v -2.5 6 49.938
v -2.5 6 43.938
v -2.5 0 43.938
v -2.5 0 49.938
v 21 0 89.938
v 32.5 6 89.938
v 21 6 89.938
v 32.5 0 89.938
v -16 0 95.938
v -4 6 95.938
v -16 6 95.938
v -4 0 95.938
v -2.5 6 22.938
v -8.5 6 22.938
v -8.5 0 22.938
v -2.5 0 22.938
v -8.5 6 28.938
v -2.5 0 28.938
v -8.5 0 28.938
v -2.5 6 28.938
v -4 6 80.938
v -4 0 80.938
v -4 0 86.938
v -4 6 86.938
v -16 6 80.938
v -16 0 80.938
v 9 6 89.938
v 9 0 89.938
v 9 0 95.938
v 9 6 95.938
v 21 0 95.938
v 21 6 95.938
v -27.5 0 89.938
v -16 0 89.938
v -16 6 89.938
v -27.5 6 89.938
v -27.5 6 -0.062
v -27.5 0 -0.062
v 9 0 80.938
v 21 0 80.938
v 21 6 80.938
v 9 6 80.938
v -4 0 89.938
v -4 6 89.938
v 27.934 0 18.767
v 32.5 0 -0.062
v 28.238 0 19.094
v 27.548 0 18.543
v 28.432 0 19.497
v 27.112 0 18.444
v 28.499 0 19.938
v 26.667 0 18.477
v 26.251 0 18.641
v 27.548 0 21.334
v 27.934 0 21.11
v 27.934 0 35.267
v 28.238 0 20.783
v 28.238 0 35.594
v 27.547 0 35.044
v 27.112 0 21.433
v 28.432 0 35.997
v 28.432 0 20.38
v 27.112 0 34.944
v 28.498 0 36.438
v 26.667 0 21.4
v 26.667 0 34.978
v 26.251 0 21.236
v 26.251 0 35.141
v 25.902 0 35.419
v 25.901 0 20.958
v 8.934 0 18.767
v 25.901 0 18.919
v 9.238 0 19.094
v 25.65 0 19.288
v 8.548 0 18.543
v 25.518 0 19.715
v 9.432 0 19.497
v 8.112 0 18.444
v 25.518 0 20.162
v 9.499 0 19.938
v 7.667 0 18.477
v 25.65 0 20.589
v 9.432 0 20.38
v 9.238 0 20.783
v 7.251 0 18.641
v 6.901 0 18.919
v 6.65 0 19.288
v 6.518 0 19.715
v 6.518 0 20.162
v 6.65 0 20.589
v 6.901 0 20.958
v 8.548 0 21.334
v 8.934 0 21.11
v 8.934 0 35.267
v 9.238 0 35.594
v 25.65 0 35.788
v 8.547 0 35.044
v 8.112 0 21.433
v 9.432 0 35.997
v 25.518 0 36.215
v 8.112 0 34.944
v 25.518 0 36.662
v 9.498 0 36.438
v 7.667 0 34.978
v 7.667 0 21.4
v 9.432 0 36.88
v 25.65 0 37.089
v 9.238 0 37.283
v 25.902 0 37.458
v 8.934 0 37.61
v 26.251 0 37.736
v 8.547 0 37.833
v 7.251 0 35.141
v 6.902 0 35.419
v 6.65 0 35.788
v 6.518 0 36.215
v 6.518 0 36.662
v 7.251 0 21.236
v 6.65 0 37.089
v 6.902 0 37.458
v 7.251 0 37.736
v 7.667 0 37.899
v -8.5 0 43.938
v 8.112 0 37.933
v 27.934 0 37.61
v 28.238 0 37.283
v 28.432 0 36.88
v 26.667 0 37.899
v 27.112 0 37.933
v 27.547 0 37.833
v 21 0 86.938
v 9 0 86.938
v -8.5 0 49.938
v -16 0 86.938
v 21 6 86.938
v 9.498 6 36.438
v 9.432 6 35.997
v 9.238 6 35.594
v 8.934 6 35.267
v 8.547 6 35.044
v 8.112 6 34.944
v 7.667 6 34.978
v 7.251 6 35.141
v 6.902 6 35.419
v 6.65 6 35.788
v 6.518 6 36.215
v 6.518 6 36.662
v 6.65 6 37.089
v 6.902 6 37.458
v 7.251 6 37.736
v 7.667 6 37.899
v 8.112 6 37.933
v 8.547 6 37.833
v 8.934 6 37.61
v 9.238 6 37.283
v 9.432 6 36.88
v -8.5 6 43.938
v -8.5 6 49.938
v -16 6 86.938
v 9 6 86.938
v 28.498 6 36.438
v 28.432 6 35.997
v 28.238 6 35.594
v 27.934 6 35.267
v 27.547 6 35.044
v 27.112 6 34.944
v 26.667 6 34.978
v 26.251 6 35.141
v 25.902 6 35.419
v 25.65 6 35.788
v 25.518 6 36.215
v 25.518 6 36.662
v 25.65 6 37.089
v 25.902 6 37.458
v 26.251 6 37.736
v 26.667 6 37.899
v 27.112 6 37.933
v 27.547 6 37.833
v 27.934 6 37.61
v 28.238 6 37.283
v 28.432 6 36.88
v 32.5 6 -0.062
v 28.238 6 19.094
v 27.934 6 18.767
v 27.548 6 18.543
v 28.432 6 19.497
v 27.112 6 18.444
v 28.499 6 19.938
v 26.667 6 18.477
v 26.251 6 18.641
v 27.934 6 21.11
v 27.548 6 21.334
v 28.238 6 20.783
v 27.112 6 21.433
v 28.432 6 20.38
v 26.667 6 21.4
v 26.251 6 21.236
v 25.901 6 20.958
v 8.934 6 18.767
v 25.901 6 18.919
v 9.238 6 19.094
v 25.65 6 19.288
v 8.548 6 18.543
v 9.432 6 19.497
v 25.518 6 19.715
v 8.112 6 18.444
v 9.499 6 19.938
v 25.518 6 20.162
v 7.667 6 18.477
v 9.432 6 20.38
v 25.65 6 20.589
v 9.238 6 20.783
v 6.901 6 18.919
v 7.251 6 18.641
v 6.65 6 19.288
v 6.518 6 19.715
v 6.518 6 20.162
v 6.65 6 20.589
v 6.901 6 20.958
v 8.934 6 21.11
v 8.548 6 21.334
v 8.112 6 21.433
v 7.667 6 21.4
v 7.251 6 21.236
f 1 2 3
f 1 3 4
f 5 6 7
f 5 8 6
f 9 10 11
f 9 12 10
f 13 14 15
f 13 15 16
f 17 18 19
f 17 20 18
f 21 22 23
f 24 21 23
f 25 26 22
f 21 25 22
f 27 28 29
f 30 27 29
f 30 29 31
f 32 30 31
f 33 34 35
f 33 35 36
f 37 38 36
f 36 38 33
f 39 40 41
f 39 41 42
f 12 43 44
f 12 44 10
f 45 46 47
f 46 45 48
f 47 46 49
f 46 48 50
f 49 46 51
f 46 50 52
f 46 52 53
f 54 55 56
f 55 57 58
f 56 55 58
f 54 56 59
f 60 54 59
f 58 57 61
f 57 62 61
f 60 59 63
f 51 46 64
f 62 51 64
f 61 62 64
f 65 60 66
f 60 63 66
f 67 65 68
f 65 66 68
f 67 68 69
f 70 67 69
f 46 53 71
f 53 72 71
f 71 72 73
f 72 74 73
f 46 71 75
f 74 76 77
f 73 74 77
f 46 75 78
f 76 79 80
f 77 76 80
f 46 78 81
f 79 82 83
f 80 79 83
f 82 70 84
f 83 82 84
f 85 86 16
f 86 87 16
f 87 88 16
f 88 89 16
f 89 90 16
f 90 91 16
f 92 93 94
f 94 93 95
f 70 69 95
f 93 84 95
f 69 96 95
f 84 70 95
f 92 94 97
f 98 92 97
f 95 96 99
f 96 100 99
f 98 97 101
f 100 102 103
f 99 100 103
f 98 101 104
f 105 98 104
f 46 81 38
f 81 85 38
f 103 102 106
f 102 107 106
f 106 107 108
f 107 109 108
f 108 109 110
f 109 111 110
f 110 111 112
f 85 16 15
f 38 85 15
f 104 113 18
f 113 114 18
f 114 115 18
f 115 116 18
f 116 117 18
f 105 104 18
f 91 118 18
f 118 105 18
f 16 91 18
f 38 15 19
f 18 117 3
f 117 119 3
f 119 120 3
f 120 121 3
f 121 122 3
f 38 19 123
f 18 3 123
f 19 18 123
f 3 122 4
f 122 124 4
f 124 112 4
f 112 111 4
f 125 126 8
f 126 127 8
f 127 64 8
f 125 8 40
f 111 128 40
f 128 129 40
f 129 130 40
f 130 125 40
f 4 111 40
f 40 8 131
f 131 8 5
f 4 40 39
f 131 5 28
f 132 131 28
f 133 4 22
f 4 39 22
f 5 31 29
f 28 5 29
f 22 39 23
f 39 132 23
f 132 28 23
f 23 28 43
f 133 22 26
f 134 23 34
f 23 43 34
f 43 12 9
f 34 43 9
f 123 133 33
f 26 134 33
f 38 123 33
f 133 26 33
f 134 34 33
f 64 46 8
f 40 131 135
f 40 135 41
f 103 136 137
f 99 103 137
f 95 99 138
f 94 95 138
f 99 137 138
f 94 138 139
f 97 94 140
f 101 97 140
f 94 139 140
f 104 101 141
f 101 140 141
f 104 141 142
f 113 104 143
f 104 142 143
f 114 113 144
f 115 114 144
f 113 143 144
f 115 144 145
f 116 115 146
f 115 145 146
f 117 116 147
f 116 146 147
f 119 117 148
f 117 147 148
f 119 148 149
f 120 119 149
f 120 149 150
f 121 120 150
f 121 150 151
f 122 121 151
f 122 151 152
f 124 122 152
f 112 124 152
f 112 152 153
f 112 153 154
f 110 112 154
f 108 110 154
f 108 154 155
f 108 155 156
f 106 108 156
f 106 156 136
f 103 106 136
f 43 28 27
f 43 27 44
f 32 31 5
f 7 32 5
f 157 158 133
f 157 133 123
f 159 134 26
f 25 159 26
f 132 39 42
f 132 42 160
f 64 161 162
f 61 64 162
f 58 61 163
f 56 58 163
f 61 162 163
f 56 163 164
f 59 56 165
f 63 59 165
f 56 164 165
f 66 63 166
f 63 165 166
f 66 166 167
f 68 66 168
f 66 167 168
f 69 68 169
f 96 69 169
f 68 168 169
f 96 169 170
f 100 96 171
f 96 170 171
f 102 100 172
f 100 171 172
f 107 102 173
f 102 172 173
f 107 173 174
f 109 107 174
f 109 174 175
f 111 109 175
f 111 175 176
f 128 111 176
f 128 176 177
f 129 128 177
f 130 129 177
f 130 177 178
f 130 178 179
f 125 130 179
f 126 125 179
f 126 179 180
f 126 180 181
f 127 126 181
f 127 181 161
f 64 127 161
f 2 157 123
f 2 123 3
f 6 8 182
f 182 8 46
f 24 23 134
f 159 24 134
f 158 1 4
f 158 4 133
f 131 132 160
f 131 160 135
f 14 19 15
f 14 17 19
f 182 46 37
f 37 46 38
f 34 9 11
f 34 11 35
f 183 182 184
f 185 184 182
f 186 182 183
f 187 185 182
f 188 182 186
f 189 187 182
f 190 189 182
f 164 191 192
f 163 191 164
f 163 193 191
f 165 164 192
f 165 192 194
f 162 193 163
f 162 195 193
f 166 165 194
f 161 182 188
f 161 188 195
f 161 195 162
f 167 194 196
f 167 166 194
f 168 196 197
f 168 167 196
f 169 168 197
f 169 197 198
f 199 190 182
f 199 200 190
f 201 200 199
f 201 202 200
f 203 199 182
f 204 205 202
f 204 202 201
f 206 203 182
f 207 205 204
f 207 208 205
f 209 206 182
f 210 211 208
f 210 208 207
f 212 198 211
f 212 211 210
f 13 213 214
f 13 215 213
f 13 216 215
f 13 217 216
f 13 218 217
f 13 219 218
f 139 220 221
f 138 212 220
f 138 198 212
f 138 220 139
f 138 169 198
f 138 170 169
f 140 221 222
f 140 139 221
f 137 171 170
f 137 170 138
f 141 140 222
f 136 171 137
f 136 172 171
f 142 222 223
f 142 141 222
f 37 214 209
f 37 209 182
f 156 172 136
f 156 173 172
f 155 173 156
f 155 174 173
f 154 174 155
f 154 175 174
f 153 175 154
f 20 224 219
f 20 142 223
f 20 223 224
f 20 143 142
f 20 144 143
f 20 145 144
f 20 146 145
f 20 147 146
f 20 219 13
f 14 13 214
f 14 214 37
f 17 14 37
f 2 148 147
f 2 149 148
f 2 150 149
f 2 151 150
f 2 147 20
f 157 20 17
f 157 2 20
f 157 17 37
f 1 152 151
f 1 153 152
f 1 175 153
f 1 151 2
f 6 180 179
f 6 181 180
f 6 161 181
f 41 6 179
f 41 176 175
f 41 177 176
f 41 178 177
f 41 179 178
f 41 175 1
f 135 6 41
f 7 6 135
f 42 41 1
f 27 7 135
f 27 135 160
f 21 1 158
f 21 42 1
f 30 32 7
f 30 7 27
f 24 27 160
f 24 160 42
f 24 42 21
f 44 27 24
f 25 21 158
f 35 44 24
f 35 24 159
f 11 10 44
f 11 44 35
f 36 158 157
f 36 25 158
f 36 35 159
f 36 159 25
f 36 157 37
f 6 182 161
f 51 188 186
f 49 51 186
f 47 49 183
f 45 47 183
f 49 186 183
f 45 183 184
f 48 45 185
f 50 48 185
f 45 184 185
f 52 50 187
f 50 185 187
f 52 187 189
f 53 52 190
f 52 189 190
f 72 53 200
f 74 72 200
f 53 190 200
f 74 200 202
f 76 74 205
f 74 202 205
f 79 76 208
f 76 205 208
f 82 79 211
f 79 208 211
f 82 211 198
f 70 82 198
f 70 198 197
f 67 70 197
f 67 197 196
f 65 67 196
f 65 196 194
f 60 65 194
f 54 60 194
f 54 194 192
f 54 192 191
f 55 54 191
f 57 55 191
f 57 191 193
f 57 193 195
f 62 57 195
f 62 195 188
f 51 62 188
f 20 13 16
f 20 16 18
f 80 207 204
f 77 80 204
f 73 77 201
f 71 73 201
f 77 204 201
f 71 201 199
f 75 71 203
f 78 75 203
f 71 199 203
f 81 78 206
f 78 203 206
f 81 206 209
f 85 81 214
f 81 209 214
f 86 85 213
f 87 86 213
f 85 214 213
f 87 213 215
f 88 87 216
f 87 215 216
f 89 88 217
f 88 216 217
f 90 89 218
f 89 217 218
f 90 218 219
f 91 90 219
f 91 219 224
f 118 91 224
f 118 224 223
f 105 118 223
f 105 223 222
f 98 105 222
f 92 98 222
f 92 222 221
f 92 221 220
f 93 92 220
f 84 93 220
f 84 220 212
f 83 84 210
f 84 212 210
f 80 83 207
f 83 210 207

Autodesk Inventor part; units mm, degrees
ref_plane "YZ Plane" through (0, 0, 0) normal (1, 0, 0) x (0, 1, 0)
ref_plane "XZ Plane" through (0, 0, 0) normal (0, 1, 0) x (-1, 0, 0)
ref_plane "XY Plane" through (0, 0, 0) normal (0, 0, 1) x (1, 0, 0)
sketch "Sketch1" plane through (0, 0, 0) normal (0, 1, 0) x (-1, 0, 0)
  line L0 (27.5, -0.0615) -> (27.5, 89.9385)
  line L1 (-32.5, 89.9385) -> (-32.5, -0.0615)
  line L2 (-32.5, -0.0615) -> (-2.5, -0.0615)
  line L3 (-2.5, -0.0615) -> (-2.5, 89.9385) construction
  line L4 (-32.5, 44.9385) -> (-2.5, 44.9385) construction
  line L5 (-32.5, 89.9385) -> (27.5, 89.9385)
  line L6 (-21, 89.9385) -> (-9, 89.9385)
  line L7 (-9, 89.9385) -> (-9, 95.9385)
  line L8 (-9, 95.9385) -> (-21, 95.9385)
  line L9 (-21, 95.9385) -> (-21, 89.9385)
  line L10 (16, 89.9385) -> (4, 89.9385)
  line L11 (4, 89.9385) -> (4, 95.9385)
  line L12 (4, 95.9385) -> (16, 95.9385)
  line L13 (16, 95.9385) -> (16, 89.9385)
  line L14 (-2.5, 44.9385) -> (27.5, 44.9385) construction
  line L15 (-2.5, -0.0615) -> (27.5, -0.0615)
  line L16 (-9, 86.9385) -> (-21, 86.9385)
  line L17 (-21, 86.9385) -> (-21, 80.9385)
  line L18 (-21, 80.9385) -> (-9, 80.9385)
  line L19 (-9, 80.9385) -> (-9, 86.9385)
  line L20 (-9, 86.9385) -> (-21, 80.9385) construction
  line L21 (-21, 86.9385) -> (-9, 80.9385) construction
  line L22 (4, 86.9385) -> (16, 86.9385)
  line L23 (16, 86.9385) -> (16, 80.9385)
  line L24 (16, 80.9385) -> (4, 80.9385)
  line L25 (4, 80.9385) -> (4, 86.9385)
  line L26 (4, 86.9385) -> (16, 80.9385) construction
  line L27 (16, 86.9385) -> (4, 80.9385) construction
  point P0 (-15, 83.9385)
  point P1 (10, 83.9385)
  dimension "d0" = 60
  dimension "d1" = 90
  dimension "d18" = 12
  dimension "d19" = 6
  dimension "d20" = 18.5
  dimension "d21" = 12
  dimension "d22" = 6
  dimension "d23" = 3
extrude "Extrusion1" add sketch "Sketch1" along normal blind 6
sketch "Sketch2" plane through (0, 6, 0) normal (0, 1, 0) x (1, 0, 0)
  circle A0 centre (8, -19.9385) radius 1.4986
  circle A1 centre (27, -19.9385) radius 1.4986
  circle A2 centre (27, -36.4385) radius 1.4985
  circle A3 centre (8, -36.4385) radius 1.4985
  line L0 (27, -36.4385) -> (8, -36.4385) construction
  line L1 (8, -36.4385) -> (8, -19.9385) construction
  line L2 (8, -19.9385) -> (27, -19.9385) construction
  line L3 (27, -19.9385) -> (27, -36.4385) construction
  line L4 (27, -36.4385) -> (8, -19.9385) construction
  line L5 (27, -19.9385) -> (8, -36.4385) construction
  line L6 (32.5, 0.0615) -> (-27.5, 0.0615) construction
  line L7 (2.5, 0.0615) -> (2.5, -89.9385) construction
  line L8 (-4, -89.9385) -> (9, -89.9385) construction
  line L9 (-2.5, -49.9385) -> (-8.5, -49.9385)
  line L10 (-8.5, -49.9385) -> (-8.5, -43.9385)
  line L11 (-8.5, -43.9385) -> (-2.5, -43.9385)
  line L12 (-2.5, -43.9385) -> (-2.5, -49.9385)
  line L13 (-2.5, -28.9385) -> (-8.5, -28.9385)
  line L14 (-8.5, -28.9385) -> (-8.5, -22.9385)
  line L15 (-8.5, -22.9385) -> (-2.5, -22.9385)
  line L16 (-2.5, -22.9385) -> (-2.5, -28.9385)
  point P0 (0, 0)
  point P1 (17.5, -28.1885)
  dimension "d26" = 2.9972
  dimension "d28" = 2.9972
  dimension "d29" = 19
  dimension "d30" = 2.997
  dimension "d31" = 2.997
  dimension "d32" = 16.5
  dimension "d33" = 15
  dimension "d36" = 20
  dimension "d37" = 6
  dimension "d38" = 6
  dimension "d39" = 6
  dimension "d40" = 5
  dimension "d41" = 40
  dimension "d42" = 15
extrude "Extrusion2" cut sketch "Sketch2" against normal through all
properties part number "thumper-bumper-sidewall-v2"
